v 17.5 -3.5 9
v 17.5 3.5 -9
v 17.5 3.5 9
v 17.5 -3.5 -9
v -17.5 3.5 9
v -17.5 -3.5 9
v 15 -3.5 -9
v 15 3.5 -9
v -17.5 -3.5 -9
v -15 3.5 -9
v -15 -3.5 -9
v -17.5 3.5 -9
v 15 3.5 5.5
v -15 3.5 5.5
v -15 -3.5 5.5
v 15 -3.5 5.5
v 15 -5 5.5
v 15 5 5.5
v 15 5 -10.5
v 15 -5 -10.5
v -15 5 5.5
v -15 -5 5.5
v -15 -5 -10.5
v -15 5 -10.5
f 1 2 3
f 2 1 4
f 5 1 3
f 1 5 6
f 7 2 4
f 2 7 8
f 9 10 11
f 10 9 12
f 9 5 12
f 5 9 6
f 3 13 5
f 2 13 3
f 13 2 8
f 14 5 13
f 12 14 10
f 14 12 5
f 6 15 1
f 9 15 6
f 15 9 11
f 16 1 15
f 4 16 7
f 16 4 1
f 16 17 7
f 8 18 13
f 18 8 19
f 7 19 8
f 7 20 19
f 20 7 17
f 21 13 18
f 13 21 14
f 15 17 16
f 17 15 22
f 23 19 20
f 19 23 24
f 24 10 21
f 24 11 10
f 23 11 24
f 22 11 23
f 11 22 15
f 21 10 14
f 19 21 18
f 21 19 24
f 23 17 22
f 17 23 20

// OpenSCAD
thickness = 1.5;
size_b = [30, 10, 16];
size = [35, size_b.y-2*thickness, 18];


cube(size, center=true);
translate([0,0, (size_b.z-size.z)/2-thickness])
cube(size_b, center=true);
